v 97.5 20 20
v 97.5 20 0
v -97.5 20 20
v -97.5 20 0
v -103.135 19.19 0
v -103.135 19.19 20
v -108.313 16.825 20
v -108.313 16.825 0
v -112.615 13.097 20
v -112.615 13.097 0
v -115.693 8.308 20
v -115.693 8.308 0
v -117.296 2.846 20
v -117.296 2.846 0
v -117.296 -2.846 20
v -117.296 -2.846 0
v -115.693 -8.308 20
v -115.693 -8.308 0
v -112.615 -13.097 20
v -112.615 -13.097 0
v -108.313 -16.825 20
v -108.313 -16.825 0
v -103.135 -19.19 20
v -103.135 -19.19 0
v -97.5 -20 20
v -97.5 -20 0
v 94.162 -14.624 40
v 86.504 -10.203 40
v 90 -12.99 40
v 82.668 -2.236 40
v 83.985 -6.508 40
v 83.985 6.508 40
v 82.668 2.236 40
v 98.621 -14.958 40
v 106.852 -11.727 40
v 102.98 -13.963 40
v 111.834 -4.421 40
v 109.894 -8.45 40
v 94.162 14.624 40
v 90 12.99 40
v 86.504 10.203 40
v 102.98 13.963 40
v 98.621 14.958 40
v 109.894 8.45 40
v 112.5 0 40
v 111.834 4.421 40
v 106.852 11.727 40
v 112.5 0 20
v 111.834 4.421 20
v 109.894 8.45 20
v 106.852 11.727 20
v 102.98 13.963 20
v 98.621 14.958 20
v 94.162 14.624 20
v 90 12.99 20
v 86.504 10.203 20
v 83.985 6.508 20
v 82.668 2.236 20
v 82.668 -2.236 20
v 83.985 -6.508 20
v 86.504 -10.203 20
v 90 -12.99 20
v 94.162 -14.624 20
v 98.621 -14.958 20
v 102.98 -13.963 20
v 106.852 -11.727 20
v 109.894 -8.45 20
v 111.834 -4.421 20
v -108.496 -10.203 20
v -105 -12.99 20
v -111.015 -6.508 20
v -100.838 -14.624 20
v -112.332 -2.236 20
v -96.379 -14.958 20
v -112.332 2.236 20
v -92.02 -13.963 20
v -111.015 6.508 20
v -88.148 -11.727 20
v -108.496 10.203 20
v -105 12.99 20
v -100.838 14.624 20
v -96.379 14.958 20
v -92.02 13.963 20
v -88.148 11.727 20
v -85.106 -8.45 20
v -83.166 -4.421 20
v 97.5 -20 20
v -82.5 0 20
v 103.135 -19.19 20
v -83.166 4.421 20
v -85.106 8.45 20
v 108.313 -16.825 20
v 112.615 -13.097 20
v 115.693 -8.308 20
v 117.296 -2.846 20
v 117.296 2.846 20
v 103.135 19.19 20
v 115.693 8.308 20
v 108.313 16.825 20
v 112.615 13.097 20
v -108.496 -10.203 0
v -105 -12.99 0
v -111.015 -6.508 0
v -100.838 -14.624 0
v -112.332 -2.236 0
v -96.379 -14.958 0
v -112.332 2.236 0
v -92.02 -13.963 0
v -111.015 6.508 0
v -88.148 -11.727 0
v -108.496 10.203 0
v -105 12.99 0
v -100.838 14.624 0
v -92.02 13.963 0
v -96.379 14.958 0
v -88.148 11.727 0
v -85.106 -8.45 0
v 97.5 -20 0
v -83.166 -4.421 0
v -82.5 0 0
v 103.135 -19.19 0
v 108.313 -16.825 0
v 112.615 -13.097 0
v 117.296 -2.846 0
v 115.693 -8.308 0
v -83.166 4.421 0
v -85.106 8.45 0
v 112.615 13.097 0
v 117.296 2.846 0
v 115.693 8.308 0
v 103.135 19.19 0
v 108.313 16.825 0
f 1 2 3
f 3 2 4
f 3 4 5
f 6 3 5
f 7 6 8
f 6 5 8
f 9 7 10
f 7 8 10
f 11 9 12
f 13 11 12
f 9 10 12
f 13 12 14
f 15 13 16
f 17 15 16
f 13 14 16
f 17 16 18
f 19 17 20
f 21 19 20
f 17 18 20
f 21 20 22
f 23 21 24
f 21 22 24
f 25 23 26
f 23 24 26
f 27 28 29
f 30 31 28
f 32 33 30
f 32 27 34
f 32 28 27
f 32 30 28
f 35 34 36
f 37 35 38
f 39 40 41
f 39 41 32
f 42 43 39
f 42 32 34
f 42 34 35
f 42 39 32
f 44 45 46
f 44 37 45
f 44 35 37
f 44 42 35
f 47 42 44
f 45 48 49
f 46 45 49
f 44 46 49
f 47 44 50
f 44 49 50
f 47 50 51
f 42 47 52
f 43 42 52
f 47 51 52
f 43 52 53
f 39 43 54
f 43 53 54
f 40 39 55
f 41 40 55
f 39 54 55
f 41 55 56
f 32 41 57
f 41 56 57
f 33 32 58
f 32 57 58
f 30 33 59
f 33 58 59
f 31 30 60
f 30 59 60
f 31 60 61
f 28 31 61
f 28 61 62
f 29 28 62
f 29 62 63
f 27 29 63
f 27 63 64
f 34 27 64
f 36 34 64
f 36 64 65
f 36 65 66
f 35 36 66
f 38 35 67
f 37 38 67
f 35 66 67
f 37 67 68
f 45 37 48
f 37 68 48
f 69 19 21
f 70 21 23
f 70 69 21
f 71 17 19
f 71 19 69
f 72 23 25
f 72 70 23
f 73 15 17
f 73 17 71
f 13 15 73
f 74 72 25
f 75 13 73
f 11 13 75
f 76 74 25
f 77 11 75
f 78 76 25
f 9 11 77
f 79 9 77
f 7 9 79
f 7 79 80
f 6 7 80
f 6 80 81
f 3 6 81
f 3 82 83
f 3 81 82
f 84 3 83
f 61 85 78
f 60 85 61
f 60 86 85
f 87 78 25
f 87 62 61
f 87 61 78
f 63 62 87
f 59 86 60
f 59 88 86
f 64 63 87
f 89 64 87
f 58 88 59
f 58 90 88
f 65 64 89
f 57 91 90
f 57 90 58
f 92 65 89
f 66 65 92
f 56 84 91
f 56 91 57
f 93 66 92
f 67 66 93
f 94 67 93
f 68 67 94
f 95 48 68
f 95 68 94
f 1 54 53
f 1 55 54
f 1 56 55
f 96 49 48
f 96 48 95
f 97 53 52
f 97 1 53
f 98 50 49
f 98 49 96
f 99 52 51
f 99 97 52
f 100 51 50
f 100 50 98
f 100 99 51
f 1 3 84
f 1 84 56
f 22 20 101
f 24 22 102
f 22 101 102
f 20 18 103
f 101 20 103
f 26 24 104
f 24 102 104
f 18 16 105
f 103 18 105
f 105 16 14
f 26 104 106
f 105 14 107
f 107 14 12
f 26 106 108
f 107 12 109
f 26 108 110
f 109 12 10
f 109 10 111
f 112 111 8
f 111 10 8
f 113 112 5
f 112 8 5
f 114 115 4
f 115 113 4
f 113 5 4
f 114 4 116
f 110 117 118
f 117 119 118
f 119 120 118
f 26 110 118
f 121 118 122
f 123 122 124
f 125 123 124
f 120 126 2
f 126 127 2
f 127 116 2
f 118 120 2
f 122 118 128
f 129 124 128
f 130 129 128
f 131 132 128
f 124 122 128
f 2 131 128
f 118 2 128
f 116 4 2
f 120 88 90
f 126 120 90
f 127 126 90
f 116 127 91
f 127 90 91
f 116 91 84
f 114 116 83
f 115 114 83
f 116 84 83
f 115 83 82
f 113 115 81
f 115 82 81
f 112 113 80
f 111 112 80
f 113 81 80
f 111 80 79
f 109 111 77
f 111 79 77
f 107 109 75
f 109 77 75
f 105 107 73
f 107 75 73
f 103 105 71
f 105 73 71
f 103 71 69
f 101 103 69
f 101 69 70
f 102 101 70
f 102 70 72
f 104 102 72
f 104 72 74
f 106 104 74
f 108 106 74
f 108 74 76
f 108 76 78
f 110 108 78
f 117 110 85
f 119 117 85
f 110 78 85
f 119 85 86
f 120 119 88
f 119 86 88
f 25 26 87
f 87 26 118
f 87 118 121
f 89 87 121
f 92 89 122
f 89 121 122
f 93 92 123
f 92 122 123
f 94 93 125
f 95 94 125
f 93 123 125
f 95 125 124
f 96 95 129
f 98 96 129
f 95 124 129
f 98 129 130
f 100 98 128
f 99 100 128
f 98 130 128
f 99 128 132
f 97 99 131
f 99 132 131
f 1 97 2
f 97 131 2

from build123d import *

# Parameters (mm, degrees)
BOSS_EXTRUDE1_DEPTH = 20
SKETCH2_R           = 15
CUT_EXTRUDE1_DEPTH  = 20
SKETCH3_R           = 15
BOSS_EXTRUDE2_DEPTH = 20


with BuildPart() as part:
    # Sketch1 → Boss-Extrude1 (new body)
    with BuildSketch(Plane.XY):
        with BuildLine():
            Line((97.5, 20), (-97.5, 20))
            ThreePointArc((-97.5, 20), (-117.5, 0), (-97.5, -20))
            Line((-97.5, -20), (97.5, -20))
            ThreePointArc((97.5, -20), (117.5, 0), (97.5, 20))
        make_face()
    extrude(amount=BOSS_EXTRUDE1_DEPTH)

    # Sketch2 → Cut-Extrude1 (cut)
    with BuildSketch(Plane.XY.offset(20)):
        with Locations((-97.5, 0)):
            Circle(SKETCH2_R)
    extrude(amount=-CUT_EXTRUDE1_DEPTH, mode=Mode.SUBTRACT)

    # Sketch3 → Boss-Extrude2 (add)
    with BuildSketch(Plane.XY.offset(20)):
        with Locations((97.5, 0)):
            Circle(SKETCH3_R)
    extrude(amount=BOSS_EXTRUDE2_DEPTH)


solid = part.part
